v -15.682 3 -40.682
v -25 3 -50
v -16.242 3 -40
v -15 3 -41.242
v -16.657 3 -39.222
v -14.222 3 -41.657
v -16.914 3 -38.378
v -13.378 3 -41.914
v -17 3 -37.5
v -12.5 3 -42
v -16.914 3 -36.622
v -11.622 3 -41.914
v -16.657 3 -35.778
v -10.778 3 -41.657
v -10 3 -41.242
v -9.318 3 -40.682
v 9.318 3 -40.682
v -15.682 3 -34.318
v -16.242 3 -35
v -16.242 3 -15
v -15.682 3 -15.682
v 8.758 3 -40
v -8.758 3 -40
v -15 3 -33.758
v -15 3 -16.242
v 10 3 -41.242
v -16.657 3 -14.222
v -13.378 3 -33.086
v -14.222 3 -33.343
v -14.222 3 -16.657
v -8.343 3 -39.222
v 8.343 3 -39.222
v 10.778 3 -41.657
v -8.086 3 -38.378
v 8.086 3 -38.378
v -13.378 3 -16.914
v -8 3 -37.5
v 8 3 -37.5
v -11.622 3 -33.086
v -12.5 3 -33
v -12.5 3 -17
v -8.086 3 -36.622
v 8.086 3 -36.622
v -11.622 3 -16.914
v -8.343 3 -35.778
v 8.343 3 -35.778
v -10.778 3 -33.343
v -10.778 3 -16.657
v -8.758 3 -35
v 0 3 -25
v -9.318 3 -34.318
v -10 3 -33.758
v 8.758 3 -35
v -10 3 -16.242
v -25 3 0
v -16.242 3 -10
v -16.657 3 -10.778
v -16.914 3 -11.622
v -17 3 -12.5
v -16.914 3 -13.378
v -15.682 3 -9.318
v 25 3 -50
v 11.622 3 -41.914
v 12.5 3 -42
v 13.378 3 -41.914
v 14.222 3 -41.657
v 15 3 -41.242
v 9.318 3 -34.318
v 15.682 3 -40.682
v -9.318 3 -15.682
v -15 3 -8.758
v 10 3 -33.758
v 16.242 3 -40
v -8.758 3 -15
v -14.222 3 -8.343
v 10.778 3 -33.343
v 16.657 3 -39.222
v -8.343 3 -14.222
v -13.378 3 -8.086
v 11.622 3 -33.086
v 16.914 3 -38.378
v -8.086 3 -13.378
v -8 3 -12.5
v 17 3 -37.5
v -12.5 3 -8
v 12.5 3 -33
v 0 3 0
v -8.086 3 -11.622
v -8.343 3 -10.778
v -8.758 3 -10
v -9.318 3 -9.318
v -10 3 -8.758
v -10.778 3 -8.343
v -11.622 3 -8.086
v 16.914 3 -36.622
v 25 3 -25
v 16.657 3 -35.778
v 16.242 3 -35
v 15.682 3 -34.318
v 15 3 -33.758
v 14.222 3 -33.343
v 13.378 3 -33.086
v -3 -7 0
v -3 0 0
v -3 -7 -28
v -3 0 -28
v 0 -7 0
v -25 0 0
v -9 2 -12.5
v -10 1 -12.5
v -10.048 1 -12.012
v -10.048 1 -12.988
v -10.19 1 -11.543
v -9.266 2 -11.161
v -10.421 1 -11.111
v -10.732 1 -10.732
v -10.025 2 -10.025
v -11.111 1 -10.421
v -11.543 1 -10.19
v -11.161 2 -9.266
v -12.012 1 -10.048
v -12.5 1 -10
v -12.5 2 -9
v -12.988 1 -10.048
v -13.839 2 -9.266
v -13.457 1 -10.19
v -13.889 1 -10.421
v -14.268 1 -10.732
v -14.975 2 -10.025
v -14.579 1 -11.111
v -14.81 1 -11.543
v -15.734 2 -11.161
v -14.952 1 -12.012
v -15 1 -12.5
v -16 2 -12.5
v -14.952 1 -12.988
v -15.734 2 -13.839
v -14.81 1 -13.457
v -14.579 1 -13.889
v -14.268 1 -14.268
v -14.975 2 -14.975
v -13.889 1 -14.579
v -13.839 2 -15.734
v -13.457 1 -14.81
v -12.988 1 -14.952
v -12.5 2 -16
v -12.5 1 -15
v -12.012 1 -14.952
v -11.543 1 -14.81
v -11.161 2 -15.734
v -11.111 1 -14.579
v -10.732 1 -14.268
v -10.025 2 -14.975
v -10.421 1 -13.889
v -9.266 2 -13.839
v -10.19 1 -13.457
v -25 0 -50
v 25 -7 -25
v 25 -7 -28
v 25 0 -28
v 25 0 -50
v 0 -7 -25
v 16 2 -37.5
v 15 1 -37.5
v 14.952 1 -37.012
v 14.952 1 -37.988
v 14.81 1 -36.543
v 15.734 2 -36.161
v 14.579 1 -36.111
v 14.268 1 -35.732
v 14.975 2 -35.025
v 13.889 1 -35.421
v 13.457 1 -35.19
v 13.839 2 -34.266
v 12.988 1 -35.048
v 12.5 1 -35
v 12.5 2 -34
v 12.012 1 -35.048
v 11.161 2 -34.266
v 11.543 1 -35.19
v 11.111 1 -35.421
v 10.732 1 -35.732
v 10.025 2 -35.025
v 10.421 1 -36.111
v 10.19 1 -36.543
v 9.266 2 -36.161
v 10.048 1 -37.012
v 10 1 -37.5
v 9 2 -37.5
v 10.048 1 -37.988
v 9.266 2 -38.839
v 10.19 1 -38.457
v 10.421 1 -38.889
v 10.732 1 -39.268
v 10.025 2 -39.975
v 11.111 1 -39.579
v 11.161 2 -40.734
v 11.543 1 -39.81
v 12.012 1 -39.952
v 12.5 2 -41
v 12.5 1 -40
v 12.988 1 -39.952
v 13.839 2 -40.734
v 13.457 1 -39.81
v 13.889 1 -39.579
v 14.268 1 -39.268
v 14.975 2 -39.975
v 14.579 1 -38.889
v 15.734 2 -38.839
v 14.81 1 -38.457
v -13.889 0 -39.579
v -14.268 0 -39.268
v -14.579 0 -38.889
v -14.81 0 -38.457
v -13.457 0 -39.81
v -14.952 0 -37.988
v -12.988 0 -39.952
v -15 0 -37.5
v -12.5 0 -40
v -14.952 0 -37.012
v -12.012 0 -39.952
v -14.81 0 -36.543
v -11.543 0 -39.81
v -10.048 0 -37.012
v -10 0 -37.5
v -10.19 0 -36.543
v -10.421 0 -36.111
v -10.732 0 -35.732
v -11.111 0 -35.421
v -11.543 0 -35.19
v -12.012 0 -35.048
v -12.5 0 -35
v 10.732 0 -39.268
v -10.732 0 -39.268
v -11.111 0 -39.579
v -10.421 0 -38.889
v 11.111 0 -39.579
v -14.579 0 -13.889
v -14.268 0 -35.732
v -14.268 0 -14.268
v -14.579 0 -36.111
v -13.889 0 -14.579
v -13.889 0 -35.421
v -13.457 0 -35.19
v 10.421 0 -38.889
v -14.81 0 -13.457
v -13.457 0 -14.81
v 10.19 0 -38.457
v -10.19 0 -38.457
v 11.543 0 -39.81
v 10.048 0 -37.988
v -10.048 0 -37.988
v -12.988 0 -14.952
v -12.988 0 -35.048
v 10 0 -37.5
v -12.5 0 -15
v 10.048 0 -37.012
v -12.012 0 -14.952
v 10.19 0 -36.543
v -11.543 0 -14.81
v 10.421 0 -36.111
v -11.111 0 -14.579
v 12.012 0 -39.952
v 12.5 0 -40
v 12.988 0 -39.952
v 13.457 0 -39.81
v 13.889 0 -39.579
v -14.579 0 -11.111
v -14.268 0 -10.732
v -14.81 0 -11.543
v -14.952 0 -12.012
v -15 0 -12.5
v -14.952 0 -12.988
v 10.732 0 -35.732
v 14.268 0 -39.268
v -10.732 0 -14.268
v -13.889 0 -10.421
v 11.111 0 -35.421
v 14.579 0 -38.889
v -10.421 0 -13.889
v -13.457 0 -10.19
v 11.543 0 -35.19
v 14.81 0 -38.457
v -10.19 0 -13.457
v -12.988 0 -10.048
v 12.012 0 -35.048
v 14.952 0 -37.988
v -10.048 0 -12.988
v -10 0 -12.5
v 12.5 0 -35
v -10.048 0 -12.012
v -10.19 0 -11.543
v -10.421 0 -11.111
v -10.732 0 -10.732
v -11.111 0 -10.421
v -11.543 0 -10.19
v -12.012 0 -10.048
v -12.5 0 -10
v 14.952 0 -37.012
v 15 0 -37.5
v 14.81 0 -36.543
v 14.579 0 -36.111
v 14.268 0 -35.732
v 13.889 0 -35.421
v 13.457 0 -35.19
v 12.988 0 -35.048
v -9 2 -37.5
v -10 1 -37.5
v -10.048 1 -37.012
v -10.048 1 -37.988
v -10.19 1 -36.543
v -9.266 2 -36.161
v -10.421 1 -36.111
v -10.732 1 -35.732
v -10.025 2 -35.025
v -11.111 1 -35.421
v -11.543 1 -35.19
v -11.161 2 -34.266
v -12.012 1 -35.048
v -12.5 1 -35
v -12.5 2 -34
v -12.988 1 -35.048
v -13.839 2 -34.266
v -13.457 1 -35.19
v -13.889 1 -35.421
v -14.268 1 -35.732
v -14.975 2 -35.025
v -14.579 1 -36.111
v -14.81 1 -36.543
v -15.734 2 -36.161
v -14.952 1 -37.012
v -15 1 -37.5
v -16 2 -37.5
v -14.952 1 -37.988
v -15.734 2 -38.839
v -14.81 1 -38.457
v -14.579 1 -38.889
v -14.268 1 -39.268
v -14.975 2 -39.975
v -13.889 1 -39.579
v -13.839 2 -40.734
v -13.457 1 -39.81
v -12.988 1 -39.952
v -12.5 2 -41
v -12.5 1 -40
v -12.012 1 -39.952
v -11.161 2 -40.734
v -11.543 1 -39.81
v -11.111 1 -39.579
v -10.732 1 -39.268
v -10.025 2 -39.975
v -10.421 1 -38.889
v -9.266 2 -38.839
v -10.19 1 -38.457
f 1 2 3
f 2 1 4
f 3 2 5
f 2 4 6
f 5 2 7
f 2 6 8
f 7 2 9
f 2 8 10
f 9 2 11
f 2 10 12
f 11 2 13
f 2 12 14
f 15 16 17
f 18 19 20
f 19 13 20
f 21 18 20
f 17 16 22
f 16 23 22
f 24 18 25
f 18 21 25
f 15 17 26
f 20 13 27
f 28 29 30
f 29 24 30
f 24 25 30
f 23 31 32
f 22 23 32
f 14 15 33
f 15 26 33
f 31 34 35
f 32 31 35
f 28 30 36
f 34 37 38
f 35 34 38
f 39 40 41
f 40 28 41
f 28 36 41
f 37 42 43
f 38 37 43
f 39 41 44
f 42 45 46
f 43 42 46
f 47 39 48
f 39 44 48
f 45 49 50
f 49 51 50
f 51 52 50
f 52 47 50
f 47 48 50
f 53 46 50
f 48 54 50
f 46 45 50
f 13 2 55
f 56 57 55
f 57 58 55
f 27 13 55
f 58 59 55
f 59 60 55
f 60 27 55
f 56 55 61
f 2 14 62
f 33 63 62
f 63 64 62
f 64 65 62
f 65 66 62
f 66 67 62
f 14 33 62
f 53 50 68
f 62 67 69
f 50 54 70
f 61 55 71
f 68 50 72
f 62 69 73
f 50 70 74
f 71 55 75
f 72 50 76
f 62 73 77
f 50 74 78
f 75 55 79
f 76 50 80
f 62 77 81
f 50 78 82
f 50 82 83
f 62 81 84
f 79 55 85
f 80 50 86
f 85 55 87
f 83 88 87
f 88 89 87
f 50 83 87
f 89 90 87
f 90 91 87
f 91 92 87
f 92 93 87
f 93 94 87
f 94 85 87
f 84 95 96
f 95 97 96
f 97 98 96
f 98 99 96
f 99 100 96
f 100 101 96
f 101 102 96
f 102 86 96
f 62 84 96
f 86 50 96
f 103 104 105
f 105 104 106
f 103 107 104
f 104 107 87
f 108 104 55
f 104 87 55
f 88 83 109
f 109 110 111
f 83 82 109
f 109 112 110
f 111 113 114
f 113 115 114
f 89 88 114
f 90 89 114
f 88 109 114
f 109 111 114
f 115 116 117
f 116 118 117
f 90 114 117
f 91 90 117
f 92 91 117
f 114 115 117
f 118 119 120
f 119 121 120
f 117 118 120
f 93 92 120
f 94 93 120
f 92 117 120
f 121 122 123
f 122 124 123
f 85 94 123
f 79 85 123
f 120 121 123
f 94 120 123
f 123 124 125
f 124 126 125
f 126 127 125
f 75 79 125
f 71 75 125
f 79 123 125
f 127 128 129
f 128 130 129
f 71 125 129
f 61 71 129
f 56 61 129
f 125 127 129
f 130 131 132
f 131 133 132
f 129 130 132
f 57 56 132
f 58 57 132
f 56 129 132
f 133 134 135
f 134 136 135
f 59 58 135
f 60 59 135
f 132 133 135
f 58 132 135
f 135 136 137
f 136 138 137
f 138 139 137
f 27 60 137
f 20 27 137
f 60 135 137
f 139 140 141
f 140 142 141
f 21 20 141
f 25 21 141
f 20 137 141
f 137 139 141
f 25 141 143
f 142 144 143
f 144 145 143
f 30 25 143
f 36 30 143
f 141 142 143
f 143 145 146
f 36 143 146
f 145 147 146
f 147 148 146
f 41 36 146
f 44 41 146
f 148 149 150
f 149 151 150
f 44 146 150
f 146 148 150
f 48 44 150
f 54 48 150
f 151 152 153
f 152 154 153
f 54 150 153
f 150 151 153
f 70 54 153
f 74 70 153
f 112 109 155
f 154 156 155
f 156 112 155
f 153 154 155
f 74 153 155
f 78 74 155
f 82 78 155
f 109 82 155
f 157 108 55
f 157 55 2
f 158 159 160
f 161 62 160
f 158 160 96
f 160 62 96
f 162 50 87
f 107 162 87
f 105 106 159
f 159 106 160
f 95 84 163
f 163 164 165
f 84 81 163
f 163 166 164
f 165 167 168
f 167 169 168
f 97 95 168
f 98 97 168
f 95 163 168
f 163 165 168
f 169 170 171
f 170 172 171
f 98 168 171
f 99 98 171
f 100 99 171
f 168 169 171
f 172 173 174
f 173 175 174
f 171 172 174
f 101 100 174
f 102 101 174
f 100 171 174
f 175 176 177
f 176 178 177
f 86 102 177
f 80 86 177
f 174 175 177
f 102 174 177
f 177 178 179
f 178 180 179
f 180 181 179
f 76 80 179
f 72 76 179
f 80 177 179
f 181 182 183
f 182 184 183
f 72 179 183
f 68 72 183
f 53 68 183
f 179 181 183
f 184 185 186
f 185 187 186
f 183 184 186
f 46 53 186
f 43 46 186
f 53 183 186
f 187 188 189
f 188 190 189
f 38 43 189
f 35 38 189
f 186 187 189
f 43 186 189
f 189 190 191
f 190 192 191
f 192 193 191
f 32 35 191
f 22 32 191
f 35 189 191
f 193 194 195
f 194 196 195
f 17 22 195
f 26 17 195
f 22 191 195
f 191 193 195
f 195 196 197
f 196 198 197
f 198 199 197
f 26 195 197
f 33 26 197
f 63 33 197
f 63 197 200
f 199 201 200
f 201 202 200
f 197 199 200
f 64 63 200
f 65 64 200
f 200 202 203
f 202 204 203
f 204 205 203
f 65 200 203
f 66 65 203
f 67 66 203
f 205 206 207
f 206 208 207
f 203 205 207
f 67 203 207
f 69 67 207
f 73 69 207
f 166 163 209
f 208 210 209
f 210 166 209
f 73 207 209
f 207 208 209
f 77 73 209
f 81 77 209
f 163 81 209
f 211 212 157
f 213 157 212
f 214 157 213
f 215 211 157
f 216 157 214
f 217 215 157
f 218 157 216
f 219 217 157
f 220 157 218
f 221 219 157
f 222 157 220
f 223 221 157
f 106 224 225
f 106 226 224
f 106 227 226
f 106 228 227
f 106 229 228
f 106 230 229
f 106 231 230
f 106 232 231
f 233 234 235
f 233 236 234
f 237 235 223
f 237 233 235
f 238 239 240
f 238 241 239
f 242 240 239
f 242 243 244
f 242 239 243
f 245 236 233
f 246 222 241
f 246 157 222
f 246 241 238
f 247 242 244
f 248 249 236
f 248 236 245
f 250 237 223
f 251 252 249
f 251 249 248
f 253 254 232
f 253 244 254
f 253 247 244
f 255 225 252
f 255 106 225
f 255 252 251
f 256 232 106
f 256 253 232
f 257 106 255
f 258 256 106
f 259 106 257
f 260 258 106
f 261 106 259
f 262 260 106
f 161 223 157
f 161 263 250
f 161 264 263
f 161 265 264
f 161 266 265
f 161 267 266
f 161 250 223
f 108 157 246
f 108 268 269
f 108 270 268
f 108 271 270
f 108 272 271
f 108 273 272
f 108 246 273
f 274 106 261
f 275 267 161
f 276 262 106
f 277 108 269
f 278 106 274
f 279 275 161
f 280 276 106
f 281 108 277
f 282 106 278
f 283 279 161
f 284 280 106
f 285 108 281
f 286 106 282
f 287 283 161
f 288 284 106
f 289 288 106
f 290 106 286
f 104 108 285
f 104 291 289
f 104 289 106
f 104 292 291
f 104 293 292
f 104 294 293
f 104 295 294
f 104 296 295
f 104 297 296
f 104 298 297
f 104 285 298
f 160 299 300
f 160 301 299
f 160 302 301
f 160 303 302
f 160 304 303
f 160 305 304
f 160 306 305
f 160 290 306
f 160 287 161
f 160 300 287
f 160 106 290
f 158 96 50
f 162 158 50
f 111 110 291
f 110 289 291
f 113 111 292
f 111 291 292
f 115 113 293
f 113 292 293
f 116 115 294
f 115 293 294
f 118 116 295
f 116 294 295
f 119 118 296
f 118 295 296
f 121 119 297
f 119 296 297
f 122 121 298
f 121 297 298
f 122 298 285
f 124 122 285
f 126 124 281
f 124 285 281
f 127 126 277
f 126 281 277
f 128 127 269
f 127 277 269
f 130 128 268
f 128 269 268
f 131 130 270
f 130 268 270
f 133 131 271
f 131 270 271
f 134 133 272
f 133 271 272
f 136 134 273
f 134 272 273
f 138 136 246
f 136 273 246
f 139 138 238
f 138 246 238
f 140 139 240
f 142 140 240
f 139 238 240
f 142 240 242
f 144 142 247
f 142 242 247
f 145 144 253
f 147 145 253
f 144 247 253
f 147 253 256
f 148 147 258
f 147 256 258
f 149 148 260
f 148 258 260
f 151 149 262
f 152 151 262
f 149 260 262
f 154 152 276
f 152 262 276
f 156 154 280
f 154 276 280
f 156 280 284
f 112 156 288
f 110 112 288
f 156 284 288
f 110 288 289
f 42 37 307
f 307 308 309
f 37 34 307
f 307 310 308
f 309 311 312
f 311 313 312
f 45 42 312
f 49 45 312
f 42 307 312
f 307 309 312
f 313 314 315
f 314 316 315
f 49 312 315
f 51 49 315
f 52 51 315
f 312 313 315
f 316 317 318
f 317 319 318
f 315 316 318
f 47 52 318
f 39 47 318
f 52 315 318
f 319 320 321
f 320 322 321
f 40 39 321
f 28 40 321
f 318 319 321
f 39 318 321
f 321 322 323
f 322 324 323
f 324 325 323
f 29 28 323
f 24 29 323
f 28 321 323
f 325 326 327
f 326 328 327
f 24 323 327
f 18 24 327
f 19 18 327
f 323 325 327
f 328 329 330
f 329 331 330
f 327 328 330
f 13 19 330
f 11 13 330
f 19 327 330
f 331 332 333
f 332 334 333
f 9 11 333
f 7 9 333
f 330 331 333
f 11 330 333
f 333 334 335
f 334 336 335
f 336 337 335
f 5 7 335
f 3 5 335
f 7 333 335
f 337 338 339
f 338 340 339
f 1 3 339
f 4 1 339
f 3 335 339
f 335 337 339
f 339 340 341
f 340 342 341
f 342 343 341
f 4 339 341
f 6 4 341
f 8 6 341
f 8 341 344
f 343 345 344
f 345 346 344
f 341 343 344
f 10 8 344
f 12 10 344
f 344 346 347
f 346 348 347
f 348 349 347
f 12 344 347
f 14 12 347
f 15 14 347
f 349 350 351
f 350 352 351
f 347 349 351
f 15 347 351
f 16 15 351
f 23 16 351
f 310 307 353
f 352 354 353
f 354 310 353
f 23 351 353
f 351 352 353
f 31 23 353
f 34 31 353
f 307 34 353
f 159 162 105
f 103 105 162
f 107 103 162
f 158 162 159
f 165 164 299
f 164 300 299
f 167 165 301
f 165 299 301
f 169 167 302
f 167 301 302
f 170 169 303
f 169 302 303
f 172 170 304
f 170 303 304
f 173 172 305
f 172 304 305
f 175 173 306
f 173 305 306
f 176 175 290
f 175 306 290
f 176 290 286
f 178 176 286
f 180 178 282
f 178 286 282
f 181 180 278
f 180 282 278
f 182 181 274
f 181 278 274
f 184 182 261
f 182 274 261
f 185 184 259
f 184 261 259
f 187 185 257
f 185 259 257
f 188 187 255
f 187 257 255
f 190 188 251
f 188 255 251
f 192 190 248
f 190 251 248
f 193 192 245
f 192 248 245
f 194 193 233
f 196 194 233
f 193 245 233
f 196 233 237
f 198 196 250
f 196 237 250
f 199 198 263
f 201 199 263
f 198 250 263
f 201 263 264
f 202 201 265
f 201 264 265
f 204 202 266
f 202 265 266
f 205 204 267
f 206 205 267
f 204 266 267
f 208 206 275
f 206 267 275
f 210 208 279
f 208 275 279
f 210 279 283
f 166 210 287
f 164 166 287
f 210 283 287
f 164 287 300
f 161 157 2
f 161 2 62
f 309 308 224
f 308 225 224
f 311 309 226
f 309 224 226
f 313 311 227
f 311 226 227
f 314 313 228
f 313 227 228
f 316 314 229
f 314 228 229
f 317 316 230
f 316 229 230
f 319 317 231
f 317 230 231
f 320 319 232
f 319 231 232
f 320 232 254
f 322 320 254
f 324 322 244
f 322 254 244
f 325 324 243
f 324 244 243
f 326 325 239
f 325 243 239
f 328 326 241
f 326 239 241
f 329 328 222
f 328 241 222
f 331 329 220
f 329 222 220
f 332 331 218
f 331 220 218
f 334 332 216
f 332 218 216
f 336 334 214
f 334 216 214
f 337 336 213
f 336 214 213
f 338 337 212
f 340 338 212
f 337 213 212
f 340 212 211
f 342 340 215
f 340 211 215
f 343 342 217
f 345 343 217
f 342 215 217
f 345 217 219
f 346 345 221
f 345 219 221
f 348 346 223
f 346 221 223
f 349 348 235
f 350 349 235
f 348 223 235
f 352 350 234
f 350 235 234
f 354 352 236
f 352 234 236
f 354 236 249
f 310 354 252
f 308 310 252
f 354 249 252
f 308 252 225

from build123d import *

# Parameters (mm, degrees)
F1_DEPTH       = 3
F3_DEPTH       = 7
F5_D           = 5
F5_CSINK_D     = 9
F5_CSINK_ANGLE = 90


with BuildPart() as f1:
    # F0 (on Front) → F1 (new body)
    with BuildSketch(Plane.XZ):
        Polygon((0, -25), (0, 0), (-25, 0), (-25, -50), (25, -50), (25, -25), align=None)
    extrude(amount=-F1_DEPTH)

    # F2 (on face) → F3 (join)
    with BuildSketch(Plane.XZ):
        Polygon((0, -25), (0, 0), (-3, 0), (-3, -28), (25, -28), (25, -25), align=None)
    extrude(amount=F3_DEPTH)

    # F5 (through all)
    with Locations(Plane(origin=(0, 3, 0), x_dir=(-1, 0, 0), z_dir=(0, 1, 0))):
        with Locations((12.5, -12.5), (12.5, -37.5), (-12.5, -37.5)):
            CounterSinkHole(F5_D / 2, F5_CSINK_D / 2, counter_sink_angle=F5_CSINK_ANGLE)


solid = f1.part
